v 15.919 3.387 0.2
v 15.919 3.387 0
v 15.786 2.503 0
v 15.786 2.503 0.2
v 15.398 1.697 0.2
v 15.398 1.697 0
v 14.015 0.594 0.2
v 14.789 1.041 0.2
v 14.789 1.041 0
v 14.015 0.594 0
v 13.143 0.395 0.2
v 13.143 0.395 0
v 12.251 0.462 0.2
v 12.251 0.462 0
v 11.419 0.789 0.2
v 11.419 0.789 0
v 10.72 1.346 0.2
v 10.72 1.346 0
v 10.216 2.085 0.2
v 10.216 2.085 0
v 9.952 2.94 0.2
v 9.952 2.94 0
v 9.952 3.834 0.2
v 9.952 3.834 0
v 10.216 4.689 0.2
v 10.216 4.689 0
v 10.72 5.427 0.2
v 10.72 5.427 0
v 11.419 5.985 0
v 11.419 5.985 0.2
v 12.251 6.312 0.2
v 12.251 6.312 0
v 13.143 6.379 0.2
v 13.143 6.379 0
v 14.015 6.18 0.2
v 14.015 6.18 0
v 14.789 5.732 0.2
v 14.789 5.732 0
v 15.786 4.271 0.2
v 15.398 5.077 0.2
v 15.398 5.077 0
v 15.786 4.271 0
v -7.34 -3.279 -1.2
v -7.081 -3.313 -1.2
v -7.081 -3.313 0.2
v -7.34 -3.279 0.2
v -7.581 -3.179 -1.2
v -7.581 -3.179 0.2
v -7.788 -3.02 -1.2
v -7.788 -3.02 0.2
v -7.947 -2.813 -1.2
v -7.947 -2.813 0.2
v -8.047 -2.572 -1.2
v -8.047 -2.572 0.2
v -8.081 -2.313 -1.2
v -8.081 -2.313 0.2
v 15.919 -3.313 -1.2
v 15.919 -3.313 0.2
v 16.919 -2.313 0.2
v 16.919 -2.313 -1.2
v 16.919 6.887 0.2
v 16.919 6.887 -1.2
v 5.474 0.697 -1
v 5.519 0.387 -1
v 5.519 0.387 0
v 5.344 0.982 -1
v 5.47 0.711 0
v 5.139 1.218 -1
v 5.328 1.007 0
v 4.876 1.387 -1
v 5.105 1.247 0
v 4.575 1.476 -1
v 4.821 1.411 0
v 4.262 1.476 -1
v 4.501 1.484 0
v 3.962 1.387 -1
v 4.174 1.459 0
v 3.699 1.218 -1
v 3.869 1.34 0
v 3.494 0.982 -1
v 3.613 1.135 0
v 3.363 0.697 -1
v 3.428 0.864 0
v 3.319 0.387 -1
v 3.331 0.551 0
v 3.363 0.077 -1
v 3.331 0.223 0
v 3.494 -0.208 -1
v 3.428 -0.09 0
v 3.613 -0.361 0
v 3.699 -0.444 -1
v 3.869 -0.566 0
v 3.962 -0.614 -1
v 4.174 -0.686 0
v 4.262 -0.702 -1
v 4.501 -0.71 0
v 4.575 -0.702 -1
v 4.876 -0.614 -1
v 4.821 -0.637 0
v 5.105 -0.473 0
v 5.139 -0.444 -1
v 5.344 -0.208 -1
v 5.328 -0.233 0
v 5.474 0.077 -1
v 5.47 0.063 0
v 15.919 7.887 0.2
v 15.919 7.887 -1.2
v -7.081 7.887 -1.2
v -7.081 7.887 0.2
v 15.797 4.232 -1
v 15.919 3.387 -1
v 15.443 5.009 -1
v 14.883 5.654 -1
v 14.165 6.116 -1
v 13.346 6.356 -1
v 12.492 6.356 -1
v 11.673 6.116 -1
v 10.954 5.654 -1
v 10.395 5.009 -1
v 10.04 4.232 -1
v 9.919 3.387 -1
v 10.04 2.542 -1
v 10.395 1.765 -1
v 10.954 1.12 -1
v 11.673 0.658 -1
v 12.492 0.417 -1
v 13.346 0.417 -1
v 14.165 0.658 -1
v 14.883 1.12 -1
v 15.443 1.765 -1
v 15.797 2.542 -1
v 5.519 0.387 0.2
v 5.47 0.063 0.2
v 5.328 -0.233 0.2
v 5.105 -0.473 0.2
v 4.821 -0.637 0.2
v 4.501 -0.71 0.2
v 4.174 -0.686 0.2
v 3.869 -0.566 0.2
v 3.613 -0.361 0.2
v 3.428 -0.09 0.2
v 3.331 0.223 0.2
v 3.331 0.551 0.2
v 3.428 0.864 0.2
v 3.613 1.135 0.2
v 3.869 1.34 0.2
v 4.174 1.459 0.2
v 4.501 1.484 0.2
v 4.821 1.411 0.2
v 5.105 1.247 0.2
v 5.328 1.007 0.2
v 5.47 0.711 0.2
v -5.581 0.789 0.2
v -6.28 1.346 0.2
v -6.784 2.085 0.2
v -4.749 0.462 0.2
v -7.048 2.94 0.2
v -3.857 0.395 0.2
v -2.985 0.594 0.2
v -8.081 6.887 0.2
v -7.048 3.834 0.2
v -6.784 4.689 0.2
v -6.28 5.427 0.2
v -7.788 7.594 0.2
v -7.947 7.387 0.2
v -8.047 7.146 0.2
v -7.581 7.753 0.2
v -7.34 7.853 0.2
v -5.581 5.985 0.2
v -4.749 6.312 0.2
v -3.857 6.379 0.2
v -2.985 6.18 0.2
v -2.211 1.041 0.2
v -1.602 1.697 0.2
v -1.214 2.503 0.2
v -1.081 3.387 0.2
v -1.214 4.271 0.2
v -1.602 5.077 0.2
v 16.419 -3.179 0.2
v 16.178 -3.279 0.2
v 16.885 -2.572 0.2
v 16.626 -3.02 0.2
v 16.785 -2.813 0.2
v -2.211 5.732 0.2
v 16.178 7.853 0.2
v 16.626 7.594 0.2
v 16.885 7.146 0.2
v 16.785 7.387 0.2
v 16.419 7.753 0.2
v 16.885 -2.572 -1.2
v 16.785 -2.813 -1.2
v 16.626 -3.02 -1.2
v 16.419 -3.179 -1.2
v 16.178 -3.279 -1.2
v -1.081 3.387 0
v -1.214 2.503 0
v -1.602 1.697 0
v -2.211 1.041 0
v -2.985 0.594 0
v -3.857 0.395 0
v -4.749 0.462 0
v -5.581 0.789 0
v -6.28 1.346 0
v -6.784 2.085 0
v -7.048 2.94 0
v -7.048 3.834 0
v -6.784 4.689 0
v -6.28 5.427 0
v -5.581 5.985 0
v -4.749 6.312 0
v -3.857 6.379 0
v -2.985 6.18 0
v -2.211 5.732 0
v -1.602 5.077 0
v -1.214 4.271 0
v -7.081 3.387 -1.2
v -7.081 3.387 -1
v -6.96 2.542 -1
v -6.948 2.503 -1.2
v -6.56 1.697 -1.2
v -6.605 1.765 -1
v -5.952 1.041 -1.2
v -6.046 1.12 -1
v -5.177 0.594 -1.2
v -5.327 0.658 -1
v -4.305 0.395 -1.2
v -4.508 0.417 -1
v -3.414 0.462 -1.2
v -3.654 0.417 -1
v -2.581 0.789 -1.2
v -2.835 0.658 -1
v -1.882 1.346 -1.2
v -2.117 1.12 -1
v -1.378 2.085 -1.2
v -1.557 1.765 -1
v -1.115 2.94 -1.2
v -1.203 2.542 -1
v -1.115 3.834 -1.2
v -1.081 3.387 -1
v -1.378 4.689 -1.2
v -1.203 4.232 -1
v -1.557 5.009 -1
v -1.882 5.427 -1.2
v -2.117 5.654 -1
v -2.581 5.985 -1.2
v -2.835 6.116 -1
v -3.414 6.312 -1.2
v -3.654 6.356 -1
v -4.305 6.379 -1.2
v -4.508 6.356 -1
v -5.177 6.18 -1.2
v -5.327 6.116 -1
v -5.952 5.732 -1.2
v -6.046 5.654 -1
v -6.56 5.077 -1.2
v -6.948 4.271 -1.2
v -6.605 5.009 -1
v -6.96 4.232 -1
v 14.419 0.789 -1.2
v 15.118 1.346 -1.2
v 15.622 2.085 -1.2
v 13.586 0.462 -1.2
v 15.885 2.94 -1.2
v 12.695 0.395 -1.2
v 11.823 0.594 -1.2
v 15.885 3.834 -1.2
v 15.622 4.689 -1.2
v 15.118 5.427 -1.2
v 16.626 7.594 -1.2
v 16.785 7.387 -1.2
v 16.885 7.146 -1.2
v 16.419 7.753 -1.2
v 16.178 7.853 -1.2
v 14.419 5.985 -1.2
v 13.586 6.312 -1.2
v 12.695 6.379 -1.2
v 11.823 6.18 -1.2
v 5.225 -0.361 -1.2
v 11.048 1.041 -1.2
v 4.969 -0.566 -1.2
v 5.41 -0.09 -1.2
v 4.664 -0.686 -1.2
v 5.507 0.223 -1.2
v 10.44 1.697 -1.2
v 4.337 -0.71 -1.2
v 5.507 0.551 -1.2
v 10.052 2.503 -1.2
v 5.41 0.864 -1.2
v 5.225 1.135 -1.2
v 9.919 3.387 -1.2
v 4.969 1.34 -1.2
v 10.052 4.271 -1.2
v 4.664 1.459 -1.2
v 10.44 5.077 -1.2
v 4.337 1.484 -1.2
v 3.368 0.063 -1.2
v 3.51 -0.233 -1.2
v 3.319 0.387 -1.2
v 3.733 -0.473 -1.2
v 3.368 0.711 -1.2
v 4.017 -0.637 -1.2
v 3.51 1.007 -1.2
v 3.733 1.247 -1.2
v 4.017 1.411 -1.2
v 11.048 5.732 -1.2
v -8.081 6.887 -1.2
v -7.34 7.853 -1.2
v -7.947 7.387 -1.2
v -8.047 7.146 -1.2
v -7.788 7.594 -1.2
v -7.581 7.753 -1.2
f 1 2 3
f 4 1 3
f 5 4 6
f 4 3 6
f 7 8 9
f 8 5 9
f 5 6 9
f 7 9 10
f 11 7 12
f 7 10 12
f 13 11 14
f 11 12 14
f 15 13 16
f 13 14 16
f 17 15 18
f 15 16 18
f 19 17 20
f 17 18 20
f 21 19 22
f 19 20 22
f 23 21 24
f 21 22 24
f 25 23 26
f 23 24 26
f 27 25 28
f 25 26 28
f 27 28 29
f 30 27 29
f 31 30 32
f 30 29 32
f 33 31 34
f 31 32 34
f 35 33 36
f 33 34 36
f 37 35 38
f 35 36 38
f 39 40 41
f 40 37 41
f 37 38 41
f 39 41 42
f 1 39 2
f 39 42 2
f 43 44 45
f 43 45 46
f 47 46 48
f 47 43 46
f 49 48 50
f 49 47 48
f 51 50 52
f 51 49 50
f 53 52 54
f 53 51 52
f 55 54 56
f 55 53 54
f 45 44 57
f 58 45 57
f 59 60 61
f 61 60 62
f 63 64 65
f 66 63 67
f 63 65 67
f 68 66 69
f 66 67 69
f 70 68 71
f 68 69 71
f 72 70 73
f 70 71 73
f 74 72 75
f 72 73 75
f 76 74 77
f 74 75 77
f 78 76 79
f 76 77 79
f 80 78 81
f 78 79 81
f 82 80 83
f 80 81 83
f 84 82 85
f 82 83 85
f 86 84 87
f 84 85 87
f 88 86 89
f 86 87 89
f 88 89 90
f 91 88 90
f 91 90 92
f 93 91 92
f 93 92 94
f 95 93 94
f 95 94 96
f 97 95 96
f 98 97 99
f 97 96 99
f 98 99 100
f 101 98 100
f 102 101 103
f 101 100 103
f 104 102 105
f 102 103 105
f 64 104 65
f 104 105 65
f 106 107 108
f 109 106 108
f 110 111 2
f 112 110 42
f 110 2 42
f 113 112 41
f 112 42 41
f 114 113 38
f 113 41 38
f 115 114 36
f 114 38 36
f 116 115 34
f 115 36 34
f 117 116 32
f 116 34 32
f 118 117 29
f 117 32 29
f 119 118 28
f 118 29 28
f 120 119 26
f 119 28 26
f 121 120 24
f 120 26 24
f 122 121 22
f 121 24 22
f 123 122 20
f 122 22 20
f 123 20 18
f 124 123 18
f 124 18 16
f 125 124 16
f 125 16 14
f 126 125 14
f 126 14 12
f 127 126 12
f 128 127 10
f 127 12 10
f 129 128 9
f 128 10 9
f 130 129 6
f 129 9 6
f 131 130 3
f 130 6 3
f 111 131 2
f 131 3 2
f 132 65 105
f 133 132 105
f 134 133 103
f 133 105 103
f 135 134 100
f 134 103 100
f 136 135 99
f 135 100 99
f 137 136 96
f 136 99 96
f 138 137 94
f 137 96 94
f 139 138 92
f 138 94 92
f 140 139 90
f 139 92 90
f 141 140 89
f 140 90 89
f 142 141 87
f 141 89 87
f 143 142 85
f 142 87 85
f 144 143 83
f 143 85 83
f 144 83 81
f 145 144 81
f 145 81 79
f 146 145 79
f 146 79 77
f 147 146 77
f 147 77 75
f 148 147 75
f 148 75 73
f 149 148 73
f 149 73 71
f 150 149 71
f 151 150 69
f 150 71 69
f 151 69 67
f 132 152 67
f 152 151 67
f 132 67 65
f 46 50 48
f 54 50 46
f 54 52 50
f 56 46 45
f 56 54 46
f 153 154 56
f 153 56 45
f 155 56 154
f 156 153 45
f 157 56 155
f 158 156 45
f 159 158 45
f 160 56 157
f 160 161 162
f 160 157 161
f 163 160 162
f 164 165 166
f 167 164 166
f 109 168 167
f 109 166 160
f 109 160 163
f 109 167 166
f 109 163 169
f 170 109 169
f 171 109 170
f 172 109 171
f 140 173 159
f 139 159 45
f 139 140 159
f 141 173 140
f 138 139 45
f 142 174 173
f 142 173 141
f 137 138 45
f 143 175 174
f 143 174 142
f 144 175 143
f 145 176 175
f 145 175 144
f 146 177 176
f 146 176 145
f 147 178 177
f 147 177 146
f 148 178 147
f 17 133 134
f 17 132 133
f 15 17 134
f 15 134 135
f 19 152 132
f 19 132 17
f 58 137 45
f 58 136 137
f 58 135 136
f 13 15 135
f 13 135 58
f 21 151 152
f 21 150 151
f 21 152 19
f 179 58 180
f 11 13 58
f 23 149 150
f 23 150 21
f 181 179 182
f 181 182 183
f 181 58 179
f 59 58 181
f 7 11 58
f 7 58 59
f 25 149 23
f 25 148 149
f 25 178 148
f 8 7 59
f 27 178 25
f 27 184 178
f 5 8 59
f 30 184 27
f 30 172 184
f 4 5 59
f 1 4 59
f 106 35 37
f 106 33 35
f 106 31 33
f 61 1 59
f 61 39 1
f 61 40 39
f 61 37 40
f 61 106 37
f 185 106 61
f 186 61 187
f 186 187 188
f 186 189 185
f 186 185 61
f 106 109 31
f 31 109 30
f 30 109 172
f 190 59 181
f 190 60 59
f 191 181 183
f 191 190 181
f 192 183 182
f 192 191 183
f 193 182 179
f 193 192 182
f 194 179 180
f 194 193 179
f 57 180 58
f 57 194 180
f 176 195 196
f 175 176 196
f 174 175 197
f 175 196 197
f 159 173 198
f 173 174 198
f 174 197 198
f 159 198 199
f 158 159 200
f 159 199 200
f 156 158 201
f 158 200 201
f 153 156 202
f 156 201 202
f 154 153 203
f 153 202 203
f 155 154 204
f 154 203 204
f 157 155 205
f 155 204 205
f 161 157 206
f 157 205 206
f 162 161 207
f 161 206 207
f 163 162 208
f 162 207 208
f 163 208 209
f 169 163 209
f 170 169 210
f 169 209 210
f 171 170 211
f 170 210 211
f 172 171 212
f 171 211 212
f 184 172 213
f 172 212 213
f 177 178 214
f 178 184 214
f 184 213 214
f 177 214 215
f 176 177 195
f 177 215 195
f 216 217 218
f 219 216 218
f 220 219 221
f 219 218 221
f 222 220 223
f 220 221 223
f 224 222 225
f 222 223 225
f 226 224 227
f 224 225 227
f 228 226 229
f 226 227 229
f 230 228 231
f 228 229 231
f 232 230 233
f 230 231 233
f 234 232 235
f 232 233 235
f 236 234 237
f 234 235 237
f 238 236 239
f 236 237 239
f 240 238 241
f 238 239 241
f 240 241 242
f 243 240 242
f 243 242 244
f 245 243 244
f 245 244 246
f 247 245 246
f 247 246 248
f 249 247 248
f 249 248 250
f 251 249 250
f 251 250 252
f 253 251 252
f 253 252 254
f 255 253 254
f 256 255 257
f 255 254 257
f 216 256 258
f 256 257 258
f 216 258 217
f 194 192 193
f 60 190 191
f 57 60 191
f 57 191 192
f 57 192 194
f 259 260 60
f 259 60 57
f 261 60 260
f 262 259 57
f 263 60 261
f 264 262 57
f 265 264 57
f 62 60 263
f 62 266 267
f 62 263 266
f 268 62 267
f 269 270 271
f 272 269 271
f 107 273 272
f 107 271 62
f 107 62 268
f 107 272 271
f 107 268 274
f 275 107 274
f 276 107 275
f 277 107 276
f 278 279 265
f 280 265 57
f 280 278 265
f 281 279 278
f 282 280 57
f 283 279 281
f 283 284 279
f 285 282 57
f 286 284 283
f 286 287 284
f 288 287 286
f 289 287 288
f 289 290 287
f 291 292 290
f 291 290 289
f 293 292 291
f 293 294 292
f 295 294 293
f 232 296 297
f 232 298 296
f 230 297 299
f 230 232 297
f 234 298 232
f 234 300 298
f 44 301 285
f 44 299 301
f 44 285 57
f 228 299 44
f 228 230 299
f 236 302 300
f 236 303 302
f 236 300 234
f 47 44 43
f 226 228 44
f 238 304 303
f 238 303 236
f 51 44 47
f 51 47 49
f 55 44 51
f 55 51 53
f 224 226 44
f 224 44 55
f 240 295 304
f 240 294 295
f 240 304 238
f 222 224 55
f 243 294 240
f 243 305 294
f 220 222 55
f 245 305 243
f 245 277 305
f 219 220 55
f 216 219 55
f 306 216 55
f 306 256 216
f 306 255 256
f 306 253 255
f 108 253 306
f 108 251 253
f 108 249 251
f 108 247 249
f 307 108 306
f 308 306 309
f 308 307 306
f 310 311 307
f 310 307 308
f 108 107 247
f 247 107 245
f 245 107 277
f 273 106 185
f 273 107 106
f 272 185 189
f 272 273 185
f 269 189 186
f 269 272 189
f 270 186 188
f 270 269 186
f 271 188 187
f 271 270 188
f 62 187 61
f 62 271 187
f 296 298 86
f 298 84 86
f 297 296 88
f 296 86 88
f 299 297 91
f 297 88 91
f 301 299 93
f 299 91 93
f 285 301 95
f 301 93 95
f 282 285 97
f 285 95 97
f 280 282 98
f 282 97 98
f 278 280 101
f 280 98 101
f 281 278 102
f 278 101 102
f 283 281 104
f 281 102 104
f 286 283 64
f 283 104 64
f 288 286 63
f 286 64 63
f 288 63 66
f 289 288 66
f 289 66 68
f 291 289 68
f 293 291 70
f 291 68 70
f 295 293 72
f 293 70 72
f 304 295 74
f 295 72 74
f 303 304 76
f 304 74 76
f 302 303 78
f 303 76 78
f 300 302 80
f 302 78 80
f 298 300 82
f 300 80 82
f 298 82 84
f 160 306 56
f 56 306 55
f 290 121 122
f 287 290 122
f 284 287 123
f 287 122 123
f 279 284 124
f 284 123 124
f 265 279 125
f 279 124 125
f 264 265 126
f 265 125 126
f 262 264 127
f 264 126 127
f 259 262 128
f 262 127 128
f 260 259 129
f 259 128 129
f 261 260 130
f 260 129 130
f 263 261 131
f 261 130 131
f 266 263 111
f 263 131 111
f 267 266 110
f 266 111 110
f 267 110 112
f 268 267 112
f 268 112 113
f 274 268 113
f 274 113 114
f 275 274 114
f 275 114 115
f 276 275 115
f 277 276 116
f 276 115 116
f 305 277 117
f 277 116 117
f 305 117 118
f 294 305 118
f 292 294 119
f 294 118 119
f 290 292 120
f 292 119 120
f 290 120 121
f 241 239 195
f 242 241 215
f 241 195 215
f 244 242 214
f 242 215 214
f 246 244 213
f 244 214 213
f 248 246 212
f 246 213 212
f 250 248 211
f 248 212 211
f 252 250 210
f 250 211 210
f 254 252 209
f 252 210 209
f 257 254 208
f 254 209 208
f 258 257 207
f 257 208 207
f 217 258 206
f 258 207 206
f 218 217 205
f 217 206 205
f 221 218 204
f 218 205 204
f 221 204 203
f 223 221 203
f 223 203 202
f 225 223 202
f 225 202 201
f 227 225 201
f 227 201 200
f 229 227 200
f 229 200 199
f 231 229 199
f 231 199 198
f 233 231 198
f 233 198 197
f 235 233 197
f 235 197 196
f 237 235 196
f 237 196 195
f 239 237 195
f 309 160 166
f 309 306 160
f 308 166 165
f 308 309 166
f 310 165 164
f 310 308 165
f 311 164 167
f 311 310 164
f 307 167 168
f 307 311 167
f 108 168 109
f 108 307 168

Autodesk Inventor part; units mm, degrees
ref_plane "YZ Plane" through (0, 0, 0) normal (1, 0, 0) x (0, 1, 0)
ref_plane "XZ Plane" through (0, 0, 0) normal (0, 1, 0) x (-1, 0, 0)
ref_plane "XY Plane" through (0, 0, 0) normal (0, 0, 1) x (1, 0, 0)
sketch "Sketch1" plane through (0, 0, 0) normal (0, 0, 1) x (1, 0, 0)
  line L0 (-8.0811, -5.1131) -> (16.9189, -5.1131)
  line L1 (16.9189, -5.1131) -> (16.9189, 19.8869)
  line L2 (16.9189, 19.8869) -> (-8.0811, 19.8869)
  line L3 (-8.0811, 19.8869) -> (-8.0811, -5.1131)
  line L4 (-8.0811, -5.1131) -> (-7.0811, -5.1131)
  line L5 (-7.0811, -5.1131) -> (-7.0811, -4.1131)
  line L6 (-7.0811, -4.1131) -> (-8.0811, -4.1131)
  line L7 (-8.0811, -4.1131) -> (-8.0811, -5.1131)
  line L8 (16.9189, 19.8869) -> (15.9189, 19.8869)
  line L9 (15.9189, 19.8869) -> (15.9189, 18.8869)
  line L10 (15.9189, 18.8869) -> (16.9189, 18.8869)
  line L11 (16.9189, 18.8869) -> (16.9189, 19.8869)
  line L12 (-7.0811, -4.1131) -> (15.9189, -4.1131)
  line L13 (15.9189, -4.1131) -> (15.9189, 18.8869)
  line L14 (15.9189, 18.8869) -> (-7.0811, 18.8869)
  line L15 (-7.0811, 18.8869) -> (-7.0811, -4.1131)
  line L16 (-7.0811, -4.1131) -> (-1.0811, -4.1131)
  line L17 (-1.0811, -4.1131) -> (-1.0811, 17.1845)
  line L18 (-1.0811, 17.1845) -> (-7.0811, 17.1845)
  line L19 (-7.0811, 17.1845) -> (-7.0811, -4.1131)
  line L20 (15.9189, -4.1131) -> (9.9189, -4.1131)
  line L21 (9.9189, -4.1131) -> (9.9189, 17.1845)
  line L22 (9.9189, 17.1845) -> (15.9189, 17.1845)
  line L23 (15.9189, 17.1845) -> (15.9189, -4.1131)
  circle A0 centre (4.4189, 0.3869) radius 5.5
  line L24 (4.4189, 0.3869) -> (15.9189, 0.3869)
  line L25 (4.4189, 0.3869) -> (-8.0811, 0.3869)
  circle A1 centre (-4.0811, 3.3869) radius 3
  circle A2 centre (12.9189, 3.3869) radius 3
  circle A3 centre (4.4189, 0.3869) radius 5
  line L26 (4.4189, -4.6131) -> (4.4189, -3.3131)
  line L27 (4.4189, -3.3131) -> (16.9189, -3.3131)
  line L28 (4.4189, -3.3131) -> (-8.0811, -3.3131)
  line L29 (-4.0811, 6.3869) -> (-4.0811, 8.3869)
  line L30 (-4.0811, 8.3869) -> (16.9189, 8.3869)
  line L31 (-4.0811, 8.3869) -> (-8.0811, 8.3869)
  point P0 (0, 0)
  point P1 (0.3495, -3.3131)
  point P2 (8.4883, -3.3131)
  dimension "d8" = 10
  dimension "d0" = 25
  dimension "d1" = 25
  dimension "d2" = 1
  dimension "d3" = 1
  dimension "d4" = 1
  dimension "d5" = 1
  dimension "d6" = 6
  dimension "d7" = 6
  dimension "d9" = 1.3
  dimension "d10" = 2
extrude "Extrusion1" add sketch "Sketch1" against normal blind 1 contours L3 L25 L15 L28 | L15 L25 L17 L28 | L3 L31 L15 L25 | L27 L13 L30 L1 | L28 L17 A0 | A0 L21 L27 | L15 A1 L25 | L27 L21 L24 L13 | L25 A1 L17 | L17 L30 L21 A0 | L21 A2 L24 | L15 L31 L29 A1 | L13 A2 L21 L30 | L24 A2 L13 | A1 L29 L30 L17
sketch "Sketch3" plane through (0, 0, 0) normal (0, 0, 1) x (1, 0, 0)
  line L0 (-8.0811, 8.3869) -> (-8.0811, -3.3131) projected
  line L1 (-8.0811, -3.3131) -> (0.3495, -3.3131) projected
  arc A0 (8.4883, -3.3131) -> (0.3495, -3.3131) centre (4.4189, 0.3869) ccw projected
  line L2 (8.4883, -3.3131) -> (16.9189, -3.3131) projected
  line L3 (16.9189, -3.3131) -> (16.9189, 8.3869) projected
  line L4 (16.9189, 8.3869) -> (-8.0811, 8.3869) projected
  circle A1 centre (12.9189, 3.3869) radius 3 projected
  circle A2 centre (-4.0811, 3.3869) radius 3 projected
  circle A3 centre (4.4189, 0.3869) radius 1.1 projected
  arc A4 (8.4883, -3.3131) -> (0.3495, -3.3131) centre (4.4189, 0.3869) ccw projected
  line L5 (16.9189, -3.3131) -> (8.4883, -3.3131) projected
  line L6 (0.3495, -3.3131) -> (8.4883, -3.3131)
  point P0 (0, 0)
extrude "Extrusion2" add sketch "Sketch3" against normal blind 1 contours A0 L6
sketch "Sketch4" plane through (0, 0, -1) normal (0, 0, -1) x (-1, 0, 0)
  circle A0 centre (-4.4189, 0.3869) radius 1.1 projected
  line L0 (8.0811, -3.3131) -> (8.0811, 8.3869) projected
  line L1 (8.0811, 8.3869) -> (-16.9189, 8.3869) projected
  line L2 (-16.9189, 8.3869) -> (-16.9189, -3.3131) projected
  line L3 (-16.9189, -3.3131) -> (8.0811, -3.3131) projected
  circle A1 centre (-12.9189, 3.3869) radius 3 projected
  circle A2 centre (4.0811, 3.3869) radius 3 projected
  circle A3 centre (-12.9189, 3.3869) radius 4
  line L4 (-16.9189, 8.3869) -> (-16.9189, -3.3131) projected
  line L5 (-12.9189, 7.3869) -> (-12.9189, 8.3869)
  line L6 (-12.9189, 7.8869) -> (-16.9189, 7.8869)
  line L7 (-12.9189, 7.8869) -> (8.0811, 7.8869)
  line L8 (8.0811, -3.3131) -> (8.0811, 8.3869) projected
  point P0 (0, 0)
  point P1 (8.0811, 7.8869)
extrude "Extrusion3" cut sketch "Sketch4" against normal blind 1 contours L7 L5 L1 L0 | L6 L2 L1 L5
fillet "Fillet1" radius 1 4 edges at (16.9189, 7.8869, -0.5) (16.9189, -3.3131, -0.5) (-8.0811, 7.8869, -0.5) (-8.0811, -3.3131, -0.5)
sketch "Sketch5" plane through (0, 0, -1) normal (0, 0, -1) x (-1, 0, 0)
  circle A0 centre (4.0811, 3.3869) radius 3 projected
  circle A1 centre (-12.9189, 3.3869) radius 3 projected
  circle A2 centre (-4.4189, 0.3869) radius 1.1 projected
  arc A3 (7.0811, -3.3131) -> (8.0811, -2.3131) centre (7.0811, -2.3131) ccw projected
  line L0 (8.0811, -2.3131) -> (8.0811, 6.8869) projected
  arc A4 (8.0811, 6.8869) -> (7.0811, 7.8869) centre (7.0811, 6.8869) ccw projected
  line L1 (7.0811, 7.8869) -> (-15.9189, 7.8869) projected
  arc A5 (-15.9189, 7.8869) -> (-16.9189, 6.8869) centre (-15.9189, 6.8869) ccw projected
  line L2 (-16.9189, 6.8869) -> (-16.9189, -2.3131) projected
  arc A6 (-16.9189, -2.3131) -> (-15.9189, -3.3131) centre (-15.9189, -2.3131) ccw projected
  line L3 (-15.9189, -3.3131) -> (7.0811, -3.3131) projected
  point P0 (0, 0)
extrude "Extrusion4" add sketch "Sketch5" along normal blind 0.2
sketch "Sketch6" plane through (0, 0, 0) normal (0, 0, 1) x (1, 0, 0)
  arc A0 (-8.0811, -2.3131) -> (-7.0811, -3.3131) centre (-7.0811, -2.3131) ccw projected
  line L0 (-7.0811, -3.3131) -> (15.9189, -3.3131) projected
  arc A1 (15.9189, -3.3131) -> (16.9189, -2.3131) centre (15.9189, -2.3131) ccw projected
  line L1 (16.9189, -2.3131) -> (16.9189, 6.8869) projected
  arc A2 (16.9189, 6.8869) -> (15.9189, 7.8869) centre (15.9189, 6.8869) ccw projected
  line L2 (15.9189, 7.8869) -> (-7.0811, 7.8869) projected
  arc A3 (-7.0811, 7.8869) -> (-8.0811, 6.8869) centre (-7.0811, 6.8869) ccw projected
  line L3 (-8.0811, 6.8869) -> (-8.0811, -2.3131) projected
  circle A4 centre (4.4189, 0.3869) radius 1.1 projected
  circle A5 centre (12.9189, 3.3869) radius 3 projected
  circle A6 centre (-4.0811, 3.3869) radius 3 projected
  point P0 (0, 0)
extrude "Extrusion5" add sketch "Sketch6" along normal blind 0.2
properties part number "bok"
